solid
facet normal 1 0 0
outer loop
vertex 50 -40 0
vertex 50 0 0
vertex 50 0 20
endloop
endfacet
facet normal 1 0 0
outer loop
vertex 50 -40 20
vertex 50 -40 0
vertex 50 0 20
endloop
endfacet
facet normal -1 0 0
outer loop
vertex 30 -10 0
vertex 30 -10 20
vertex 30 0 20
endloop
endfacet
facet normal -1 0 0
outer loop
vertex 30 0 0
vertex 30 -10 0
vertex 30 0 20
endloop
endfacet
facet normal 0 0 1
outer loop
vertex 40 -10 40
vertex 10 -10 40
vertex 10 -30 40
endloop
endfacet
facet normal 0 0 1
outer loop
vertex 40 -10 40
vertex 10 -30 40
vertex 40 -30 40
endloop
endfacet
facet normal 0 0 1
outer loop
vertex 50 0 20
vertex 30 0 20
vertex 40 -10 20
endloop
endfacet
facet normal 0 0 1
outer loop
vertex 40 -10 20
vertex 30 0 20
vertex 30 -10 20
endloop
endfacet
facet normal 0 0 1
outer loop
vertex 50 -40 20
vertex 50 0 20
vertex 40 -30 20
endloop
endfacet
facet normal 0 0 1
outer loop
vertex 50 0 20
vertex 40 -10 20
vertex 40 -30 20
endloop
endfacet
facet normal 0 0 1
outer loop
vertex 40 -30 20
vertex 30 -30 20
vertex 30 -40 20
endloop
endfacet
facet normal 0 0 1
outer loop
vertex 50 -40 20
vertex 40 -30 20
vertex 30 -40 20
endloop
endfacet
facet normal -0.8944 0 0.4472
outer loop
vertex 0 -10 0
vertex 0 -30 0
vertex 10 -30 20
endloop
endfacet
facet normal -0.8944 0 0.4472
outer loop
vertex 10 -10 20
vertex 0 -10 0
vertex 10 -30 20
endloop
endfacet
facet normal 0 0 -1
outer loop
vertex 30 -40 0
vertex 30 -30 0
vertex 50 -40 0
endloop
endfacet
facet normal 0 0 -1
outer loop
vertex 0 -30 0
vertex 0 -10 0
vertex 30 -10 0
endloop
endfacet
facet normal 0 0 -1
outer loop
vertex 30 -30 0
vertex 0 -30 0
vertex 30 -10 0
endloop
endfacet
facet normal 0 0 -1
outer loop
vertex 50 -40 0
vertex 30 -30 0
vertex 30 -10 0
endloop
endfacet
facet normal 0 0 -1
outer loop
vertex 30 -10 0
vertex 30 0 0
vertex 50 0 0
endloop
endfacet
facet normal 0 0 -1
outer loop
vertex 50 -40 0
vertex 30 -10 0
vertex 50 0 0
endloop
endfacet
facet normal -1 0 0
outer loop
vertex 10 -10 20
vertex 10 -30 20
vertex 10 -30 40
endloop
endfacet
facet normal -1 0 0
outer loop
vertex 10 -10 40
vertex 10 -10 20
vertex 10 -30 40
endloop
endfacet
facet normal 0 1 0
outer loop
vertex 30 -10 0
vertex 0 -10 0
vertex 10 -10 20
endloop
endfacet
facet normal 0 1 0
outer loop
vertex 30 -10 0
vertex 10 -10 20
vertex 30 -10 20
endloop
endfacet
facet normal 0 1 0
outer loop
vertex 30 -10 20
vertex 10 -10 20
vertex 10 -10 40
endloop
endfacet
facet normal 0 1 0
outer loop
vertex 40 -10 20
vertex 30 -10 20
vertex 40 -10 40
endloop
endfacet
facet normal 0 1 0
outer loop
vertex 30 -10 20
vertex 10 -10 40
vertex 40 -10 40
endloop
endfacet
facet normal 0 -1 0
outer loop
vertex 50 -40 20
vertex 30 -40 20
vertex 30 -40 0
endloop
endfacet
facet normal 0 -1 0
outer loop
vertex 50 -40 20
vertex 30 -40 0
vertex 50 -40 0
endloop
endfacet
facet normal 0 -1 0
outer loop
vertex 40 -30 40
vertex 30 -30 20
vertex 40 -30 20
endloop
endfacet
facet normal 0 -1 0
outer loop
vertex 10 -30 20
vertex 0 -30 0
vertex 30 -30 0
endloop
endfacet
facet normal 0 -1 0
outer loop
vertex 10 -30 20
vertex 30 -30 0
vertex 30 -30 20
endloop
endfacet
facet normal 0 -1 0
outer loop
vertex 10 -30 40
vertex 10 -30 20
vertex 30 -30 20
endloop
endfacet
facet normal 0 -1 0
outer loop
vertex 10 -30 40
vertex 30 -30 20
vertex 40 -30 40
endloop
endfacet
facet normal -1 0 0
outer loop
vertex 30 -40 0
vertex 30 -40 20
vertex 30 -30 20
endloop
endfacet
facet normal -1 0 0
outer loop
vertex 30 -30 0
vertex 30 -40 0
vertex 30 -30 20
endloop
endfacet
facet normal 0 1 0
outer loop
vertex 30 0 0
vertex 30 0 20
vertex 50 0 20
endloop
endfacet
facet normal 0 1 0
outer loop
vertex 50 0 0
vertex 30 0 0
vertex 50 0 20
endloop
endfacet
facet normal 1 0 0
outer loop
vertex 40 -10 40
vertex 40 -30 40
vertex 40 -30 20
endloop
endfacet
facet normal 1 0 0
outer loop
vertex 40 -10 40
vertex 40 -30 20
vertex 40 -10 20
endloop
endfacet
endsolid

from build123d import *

# Parameters (mm, degrees)
F0_W     = 50
F0_H     = 40
F1_DEPTH = 40
F2_W     = 10
F2_H     = 20
F3_DEPTH = 50.001
F4_W     = 30
F4_H     = 10
F5_DEPTH = 20.001
F6_W     = 10
F6_H     = 20
F7_DEPTH = 20
F8_W     = 10
F8_H     = 20
F9_DEPTH = 30.001


with BuildPart() as f1:
    # F0 (on Front) → F1 (new body)
    with BuildSketch(Plane.XZ):
        with Locations((25, 20)):
            Rectangle(F0_W, F0_H)
    extrude(amount=F1_DEPTH)

    # F2 (on face) → F3 (cut, through all)
    with BuildSketch(Plane(origin=(0, 0, 0), x_dir=(0, -1, 0), z_dir=(-1, 0, 0))):
        with Locations((5, 30)):
            Rectangle(F2_W, F2_H)
        with Locations((35, 30)):
            Rectangle(F2_W, F2_H)
    extrude(amount=-F3_DEPTH, mode=Mode.SUBTRACT)

    # F4 (on face) → F5 (cut, through all)
    with BuildSketch(Plane.XY.offset(20)):
        with Locations((15, -5)):
            Rectangle(F4_W, F4_H)
        with Locations((15, -35)):
            Rectangle(F4_W, F4_H)
    extrude(amount=-F5_DEPTH, mode=Mode.SUBTRACT)

    # F6 (on face) → F7 (cut, through all)
    with BuildSketch(Plane.XY.offset(40)):
        with Locations((45, -20)):
            Rectangle(F6_W, F6_H)
    extrude(amount=-F7_DEPTH, mode=Mode.SUBTRACT)

    # F8 (on face) → F9 (cut, through all)
    with BuildSketch(Plane.XZ.offset(30)):
        with Locations((5, 30)):
            Rectangle(F8_W, F8_H)
        Polygon((10, 20), (0, 20), (0, 0), align=None)
    extrude(amount=-F9_DEPTH, mode=Mode.SUBTRACT)


solid = f1.part
